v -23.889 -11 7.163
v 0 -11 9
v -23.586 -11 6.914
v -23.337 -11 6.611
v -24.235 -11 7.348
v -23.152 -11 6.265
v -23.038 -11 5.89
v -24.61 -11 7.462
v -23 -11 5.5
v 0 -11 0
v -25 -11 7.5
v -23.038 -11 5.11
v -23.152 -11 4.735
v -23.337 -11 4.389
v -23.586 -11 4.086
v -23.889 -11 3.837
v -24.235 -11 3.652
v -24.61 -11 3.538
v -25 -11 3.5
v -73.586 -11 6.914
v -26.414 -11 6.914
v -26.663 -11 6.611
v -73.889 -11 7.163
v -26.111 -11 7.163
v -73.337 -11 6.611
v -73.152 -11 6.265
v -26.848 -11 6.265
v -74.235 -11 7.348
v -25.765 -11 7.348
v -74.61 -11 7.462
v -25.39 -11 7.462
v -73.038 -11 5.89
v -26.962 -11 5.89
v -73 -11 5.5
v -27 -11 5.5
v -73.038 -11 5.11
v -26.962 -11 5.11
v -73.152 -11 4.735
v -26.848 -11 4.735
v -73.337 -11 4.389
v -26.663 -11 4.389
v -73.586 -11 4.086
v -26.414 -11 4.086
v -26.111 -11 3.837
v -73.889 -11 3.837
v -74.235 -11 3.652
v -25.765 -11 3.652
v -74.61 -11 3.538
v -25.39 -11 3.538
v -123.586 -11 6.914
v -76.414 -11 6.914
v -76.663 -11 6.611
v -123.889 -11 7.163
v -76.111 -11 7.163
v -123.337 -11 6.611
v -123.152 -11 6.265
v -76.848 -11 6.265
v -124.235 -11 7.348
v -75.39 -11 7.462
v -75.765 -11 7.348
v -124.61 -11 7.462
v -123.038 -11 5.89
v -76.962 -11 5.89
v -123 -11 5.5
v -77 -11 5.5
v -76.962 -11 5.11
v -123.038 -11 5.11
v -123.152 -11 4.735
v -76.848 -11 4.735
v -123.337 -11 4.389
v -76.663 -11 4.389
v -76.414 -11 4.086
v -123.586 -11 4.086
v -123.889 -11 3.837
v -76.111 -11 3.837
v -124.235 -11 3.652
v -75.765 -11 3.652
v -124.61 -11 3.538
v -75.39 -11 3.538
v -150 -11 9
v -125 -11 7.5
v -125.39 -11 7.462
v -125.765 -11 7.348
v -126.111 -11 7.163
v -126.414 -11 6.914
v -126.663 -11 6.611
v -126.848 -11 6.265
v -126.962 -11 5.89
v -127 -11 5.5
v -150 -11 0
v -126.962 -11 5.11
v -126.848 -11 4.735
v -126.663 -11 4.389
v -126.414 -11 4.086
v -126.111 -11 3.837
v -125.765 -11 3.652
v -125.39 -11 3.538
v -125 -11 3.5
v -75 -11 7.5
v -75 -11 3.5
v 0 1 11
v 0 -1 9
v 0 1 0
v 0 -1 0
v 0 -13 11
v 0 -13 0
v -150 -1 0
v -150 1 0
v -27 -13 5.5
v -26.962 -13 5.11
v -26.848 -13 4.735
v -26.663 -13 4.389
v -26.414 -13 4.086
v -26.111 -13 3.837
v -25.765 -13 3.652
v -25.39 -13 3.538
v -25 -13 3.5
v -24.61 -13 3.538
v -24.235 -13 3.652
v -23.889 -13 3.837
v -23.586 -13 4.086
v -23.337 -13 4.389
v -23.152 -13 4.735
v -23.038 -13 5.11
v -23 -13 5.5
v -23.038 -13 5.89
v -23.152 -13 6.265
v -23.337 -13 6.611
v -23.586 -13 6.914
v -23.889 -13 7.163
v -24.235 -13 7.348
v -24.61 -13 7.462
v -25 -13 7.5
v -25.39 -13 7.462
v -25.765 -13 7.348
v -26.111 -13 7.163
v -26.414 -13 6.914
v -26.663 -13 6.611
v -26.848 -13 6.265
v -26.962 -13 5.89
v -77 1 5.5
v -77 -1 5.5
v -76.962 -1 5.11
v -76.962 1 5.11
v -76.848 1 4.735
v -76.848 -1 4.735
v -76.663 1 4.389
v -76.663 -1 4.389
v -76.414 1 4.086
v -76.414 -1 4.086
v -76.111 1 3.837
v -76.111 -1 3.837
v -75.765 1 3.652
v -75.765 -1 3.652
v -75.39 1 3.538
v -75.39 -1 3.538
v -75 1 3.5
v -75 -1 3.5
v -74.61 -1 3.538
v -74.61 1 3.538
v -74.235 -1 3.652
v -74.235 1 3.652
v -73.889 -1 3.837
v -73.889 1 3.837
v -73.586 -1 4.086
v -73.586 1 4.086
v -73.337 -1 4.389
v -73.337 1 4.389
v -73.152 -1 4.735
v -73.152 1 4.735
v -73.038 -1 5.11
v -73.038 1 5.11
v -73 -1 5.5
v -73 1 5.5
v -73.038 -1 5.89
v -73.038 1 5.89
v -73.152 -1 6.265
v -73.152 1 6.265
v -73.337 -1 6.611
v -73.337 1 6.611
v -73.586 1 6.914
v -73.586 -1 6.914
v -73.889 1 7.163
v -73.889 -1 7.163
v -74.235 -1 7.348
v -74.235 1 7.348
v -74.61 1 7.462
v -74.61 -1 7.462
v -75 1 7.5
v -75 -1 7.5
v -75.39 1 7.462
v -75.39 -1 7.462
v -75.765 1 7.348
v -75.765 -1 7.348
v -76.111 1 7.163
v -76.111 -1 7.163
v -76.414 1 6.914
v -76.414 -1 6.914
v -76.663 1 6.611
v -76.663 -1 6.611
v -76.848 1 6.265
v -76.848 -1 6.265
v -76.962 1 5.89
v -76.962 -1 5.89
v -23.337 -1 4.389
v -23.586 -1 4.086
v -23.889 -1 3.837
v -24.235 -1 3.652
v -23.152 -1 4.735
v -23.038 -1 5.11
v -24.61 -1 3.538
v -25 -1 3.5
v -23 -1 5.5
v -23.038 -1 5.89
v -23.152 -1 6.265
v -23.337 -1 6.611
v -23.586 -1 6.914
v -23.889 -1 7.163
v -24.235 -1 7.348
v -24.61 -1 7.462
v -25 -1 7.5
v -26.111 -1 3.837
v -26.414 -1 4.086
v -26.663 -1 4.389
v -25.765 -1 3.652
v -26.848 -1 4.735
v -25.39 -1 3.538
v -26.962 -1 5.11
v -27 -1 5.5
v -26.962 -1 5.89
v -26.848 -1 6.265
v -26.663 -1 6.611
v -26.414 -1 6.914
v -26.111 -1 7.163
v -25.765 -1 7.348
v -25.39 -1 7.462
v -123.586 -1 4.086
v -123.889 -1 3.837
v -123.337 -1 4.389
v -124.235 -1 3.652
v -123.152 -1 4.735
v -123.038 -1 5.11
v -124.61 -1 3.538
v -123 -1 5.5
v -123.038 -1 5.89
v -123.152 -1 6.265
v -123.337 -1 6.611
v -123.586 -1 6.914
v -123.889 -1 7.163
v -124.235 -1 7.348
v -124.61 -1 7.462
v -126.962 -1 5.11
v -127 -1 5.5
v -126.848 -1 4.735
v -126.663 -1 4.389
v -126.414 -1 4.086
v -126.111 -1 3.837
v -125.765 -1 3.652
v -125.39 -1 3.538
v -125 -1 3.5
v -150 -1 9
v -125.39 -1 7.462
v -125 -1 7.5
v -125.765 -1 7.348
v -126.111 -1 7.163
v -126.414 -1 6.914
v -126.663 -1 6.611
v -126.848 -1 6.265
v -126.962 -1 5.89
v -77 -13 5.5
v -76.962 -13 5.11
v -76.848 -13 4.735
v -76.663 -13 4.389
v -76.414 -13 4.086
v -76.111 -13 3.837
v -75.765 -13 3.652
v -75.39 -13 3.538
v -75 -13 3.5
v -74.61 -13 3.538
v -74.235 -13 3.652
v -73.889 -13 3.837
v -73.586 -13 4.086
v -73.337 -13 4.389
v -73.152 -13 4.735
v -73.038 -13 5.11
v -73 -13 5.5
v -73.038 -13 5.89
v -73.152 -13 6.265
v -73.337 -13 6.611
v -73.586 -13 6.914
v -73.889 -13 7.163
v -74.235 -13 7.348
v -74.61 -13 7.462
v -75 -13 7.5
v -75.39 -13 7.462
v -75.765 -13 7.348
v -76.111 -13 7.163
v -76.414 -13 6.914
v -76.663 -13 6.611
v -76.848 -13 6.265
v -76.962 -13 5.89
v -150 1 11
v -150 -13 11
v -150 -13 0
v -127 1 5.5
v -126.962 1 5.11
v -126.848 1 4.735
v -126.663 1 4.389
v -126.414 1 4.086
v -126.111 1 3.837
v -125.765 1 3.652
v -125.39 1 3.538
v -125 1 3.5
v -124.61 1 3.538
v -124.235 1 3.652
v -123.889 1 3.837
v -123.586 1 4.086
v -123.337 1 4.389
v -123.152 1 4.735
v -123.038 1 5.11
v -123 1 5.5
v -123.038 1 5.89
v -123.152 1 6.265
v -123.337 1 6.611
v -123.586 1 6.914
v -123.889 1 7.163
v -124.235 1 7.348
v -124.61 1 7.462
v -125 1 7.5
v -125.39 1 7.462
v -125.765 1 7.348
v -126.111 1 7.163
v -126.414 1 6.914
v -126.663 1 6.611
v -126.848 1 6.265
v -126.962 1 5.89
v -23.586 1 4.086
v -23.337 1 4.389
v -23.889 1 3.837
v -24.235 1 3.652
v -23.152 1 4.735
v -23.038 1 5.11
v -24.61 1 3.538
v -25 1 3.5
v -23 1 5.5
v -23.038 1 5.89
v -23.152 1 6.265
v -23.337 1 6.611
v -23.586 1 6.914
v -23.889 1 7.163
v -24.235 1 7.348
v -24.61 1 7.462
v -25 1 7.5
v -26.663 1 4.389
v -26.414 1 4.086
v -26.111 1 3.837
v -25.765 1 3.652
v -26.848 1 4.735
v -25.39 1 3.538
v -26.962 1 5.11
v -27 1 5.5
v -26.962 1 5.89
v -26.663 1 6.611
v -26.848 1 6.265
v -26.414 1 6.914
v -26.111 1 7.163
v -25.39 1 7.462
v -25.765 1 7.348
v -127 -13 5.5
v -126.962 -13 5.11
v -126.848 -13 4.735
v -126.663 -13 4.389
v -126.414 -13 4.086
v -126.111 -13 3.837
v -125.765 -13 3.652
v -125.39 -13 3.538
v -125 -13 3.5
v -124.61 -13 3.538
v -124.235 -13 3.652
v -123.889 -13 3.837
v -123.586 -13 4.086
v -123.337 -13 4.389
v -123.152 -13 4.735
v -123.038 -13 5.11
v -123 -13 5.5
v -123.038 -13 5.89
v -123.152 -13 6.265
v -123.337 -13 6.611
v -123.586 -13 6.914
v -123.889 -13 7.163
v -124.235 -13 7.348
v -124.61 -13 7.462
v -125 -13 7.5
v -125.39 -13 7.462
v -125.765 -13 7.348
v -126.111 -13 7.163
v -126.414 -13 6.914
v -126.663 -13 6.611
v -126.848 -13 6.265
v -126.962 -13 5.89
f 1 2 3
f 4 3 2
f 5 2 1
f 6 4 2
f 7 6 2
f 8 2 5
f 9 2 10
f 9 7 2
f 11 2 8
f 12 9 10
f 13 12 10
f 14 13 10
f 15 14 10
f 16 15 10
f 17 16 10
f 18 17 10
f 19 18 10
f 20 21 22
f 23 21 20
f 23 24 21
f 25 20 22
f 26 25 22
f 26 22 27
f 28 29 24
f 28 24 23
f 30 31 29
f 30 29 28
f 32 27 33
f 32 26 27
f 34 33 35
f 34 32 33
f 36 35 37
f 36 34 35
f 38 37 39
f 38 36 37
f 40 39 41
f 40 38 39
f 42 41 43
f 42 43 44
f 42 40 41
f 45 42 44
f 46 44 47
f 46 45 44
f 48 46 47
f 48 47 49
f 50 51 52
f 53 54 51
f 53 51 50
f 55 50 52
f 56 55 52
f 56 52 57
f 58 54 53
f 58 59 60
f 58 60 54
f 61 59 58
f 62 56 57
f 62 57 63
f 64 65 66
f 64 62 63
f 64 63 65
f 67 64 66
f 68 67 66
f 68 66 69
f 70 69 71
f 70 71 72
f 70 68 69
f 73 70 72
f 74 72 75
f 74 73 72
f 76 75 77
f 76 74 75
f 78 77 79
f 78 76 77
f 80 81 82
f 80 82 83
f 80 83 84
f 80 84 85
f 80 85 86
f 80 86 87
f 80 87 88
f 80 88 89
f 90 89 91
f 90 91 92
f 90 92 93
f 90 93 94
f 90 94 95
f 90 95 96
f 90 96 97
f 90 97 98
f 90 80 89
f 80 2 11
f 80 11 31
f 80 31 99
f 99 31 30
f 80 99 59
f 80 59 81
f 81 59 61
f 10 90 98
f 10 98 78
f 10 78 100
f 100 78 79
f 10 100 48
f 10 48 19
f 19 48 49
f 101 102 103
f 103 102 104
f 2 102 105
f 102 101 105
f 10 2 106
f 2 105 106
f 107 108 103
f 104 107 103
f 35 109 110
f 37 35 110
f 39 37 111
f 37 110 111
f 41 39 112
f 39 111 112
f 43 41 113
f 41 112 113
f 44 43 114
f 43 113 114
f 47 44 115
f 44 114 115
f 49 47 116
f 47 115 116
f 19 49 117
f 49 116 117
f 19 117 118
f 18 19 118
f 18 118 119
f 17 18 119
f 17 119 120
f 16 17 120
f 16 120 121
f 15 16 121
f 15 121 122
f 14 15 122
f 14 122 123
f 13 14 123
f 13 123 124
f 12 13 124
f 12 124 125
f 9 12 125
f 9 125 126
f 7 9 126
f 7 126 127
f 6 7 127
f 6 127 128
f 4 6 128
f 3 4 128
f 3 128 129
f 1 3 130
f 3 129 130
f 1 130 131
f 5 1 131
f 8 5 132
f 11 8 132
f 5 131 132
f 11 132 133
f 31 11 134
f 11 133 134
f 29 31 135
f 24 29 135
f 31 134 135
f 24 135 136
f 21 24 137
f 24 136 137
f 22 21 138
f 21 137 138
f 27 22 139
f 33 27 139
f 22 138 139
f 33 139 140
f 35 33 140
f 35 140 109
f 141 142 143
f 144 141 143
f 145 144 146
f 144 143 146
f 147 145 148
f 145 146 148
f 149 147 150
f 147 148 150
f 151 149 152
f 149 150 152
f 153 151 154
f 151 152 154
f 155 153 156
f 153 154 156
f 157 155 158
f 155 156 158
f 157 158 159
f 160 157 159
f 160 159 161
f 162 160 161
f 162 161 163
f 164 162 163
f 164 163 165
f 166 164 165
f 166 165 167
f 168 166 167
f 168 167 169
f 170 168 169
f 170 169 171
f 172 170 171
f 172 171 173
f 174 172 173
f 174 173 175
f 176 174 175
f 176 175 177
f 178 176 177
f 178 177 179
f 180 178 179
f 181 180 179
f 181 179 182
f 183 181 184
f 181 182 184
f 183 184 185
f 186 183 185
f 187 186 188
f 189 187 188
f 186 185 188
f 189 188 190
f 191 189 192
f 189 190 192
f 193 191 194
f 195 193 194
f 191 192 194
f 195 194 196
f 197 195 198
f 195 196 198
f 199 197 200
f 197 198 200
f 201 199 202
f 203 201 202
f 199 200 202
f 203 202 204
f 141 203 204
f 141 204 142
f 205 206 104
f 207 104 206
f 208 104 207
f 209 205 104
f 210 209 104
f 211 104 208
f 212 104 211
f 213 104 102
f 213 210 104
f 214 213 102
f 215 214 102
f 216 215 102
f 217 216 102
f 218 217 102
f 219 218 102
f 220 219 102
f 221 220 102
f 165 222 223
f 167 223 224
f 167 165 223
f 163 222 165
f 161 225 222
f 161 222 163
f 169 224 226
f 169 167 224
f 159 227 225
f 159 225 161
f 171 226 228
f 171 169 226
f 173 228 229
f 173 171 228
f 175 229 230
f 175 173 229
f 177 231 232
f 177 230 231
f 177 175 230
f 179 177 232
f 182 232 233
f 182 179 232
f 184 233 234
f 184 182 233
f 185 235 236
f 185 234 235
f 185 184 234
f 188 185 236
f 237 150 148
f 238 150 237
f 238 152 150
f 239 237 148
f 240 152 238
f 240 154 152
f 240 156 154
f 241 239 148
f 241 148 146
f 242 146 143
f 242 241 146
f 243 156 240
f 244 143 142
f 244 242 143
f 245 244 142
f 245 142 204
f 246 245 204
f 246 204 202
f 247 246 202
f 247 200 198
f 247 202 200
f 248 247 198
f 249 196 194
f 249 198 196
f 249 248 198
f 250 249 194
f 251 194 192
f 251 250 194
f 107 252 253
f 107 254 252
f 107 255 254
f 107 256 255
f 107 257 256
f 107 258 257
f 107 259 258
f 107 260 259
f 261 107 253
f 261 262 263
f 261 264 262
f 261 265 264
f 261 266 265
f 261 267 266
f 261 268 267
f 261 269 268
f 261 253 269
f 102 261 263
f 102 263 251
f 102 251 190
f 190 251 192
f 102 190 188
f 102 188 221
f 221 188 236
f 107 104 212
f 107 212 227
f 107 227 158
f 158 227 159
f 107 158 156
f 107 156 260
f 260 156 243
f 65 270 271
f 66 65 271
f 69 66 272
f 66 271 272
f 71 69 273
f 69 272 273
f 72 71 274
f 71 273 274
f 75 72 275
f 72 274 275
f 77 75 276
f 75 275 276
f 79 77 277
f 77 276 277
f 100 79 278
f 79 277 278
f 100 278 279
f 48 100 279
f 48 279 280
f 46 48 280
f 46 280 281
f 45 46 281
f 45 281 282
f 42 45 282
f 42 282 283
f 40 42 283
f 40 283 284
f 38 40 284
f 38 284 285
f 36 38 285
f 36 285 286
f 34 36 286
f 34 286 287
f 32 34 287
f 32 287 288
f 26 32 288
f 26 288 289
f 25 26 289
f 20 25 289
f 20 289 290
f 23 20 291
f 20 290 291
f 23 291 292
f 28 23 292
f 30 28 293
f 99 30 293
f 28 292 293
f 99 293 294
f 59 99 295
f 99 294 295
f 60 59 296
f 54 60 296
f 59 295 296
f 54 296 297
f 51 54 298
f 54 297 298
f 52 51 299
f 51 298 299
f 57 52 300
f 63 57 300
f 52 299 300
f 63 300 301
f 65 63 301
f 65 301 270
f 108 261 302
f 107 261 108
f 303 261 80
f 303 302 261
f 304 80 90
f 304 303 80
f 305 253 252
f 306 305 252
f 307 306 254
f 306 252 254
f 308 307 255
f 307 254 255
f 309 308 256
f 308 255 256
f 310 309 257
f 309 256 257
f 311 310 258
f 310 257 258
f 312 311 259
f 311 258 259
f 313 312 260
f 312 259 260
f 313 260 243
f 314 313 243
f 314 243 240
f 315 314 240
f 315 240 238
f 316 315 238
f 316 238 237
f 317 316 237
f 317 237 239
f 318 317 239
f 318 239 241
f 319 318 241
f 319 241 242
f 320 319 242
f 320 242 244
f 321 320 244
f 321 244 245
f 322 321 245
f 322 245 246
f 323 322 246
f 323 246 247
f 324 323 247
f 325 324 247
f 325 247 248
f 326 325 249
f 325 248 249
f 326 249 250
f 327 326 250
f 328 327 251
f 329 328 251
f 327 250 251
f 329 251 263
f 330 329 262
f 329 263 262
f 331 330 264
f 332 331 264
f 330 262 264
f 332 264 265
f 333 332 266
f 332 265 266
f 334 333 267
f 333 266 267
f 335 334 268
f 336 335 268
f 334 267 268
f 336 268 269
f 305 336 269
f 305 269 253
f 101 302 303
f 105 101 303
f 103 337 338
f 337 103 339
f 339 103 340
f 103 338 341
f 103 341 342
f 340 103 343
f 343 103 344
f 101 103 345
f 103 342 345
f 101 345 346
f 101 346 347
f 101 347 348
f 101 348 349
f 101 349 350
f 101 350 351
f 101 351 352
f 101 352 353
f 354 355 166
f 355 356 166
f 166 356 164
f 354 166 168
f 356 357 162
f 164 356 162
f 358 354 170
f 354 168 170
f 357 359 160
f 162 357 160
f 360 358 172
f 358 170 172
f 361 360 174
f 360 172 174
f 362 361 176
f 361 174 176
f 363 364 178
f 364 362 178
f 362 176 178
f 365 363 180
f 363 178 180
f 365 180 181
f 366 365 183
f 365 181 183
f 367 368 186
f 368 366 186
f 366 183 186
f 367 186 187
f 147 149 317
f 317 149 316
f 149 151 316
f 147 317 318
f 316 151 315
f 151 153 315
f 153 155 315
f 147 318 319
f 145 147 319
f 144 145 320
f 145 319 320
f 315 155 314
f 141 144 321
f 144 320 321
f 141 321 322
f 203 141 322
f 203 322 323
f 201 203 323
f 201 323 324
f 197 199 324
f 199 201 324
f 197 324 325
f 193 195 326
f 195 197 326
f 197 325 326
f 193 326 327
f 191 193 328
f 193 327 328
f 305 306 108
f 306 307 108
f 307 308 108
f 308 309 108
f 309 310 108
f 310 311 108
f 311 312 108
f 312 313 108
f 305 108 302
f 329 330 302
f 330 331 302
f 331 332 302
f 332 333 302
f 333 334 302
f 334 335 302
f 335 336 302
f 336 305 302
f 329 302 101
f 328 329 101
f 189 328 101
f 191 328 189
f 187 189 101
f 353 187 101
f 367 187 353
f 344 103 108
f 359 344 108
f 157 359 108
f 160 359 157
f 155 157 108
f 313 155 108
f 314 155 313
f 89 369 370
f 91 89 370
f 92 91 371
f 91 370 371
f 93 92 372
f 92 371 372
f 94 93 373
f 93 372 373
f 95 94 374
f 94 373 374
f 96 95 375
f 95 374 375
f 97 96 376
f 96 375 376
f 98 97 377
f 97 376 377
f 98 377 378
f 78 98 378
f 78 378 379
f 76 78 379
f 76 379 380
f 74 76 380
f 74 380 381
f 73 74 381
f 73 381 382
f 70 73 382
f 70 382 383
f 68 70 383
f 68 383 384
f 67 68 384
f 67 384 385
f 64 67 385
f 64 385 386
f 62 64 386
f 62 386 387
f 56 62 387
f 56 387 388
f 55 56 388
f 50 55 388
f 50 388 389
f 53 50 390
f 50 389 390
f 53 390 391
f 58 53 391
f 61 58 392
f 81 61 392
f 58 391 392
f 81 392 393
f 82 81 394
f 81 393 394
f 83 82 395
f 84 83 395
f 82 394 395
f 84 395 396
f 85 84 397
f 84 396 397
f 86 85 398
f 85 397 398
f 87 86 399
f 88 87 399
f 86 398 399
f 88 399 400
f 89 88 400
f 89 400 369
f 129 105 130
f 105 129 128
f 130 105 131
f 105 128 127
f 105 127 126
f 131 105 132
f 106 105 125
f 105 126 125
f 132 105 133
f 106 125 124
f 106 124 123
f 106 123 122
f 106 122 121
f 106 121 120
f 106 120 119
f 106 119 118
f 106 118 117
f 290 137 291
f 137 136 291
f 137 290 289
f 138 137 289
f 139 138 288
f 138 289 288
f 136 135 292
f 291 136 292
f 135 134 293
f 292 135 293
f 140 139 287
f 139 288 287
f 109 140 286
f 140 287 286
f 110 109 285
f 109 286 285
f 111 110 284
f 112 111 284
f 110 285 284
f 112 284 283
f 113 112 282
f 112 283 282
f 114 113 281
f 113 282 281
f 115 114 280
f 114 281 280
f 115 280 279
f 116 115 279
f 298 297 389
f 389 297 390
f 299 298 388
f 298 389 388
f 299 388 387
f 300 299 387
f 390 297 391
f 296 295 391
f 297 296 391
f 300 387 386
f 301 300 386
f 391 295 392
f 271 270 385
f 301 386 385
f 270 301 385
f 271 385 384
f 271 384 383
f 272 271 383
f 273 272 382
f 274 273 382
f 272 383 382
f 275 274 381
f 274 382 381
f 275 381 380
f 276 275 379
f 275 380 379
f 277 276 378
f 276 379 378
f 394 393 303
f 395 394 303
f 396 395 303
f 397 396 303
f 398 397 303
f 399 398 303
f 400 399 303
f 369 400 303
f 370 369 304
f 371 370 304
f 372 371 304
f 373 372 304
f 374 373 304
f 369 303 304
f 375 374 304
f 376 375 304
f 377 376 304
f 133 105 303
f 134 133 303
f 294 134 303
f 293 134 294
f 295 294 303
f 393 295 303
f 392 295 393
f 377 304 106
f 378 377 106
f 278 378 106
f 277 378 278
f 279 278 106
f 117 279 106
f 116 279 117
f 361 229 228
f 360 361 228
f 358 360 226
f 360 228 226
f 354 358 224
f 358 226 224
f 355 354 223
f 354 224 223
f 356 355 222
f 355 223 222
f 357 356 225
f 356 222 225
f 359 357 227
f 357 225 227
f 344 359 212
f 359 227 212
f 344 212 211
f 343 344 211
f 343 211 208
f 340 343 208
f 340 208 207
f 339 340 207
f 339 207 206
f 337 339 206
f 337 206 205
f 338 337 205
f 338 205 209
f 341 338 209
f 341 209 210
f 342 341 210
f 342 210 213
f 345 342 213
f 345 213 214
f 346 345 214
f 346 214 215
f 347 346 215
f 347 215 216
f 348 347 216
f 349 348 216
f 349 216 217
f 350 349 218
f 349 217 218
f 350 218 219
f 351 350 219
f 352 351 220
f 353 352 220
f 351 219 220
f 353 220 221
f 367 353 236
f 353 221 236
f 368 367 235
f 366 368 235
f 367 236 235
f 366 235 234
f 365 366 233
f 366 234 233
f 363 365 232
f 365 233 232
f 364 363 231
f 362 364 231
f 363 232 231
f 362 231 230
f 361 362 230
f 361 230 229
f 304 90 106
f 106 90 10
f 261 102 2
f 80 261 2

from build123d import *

# Parameters (mm, degrees)
SURFACE_EXTRUDE1_1_BACK  = 150
SURFACE_EXTRUDE1_1_DEPTH = 150
THICKEN1_T1              = 1
THICKEN1_T2              = 1
F_4_0MM_DOWEL_HOLE1_D    = 4


with BuildPart() as body_1:
    # Surface-Extrude1: a surface, the sketch's curves swept straight by 150 mm
    with BuildLine(Plane(origin=(0, 0, 0), x_dir=(0, 0, -1), z_dir=(1, 0, 0)).offset(-SURFACE_EXTRUDE1_1_BACK), mode=Mode.PRIVATE) as surface_extrude1_1_path:
        Line((0, 0), (-10, 0))
        Line((-10, 0), (-10, -12))
        Line((-10, -12), (0, -12))
    surface_extrude1_1 = Shell.extrude(surface_extrude1_1_path.wire(), (1 * SURFACE_EXTRUDE1_1_DEPTH, 0 * SURFACE_EXTRUDE1_1_DEPTH, 0 * SURFACE_EXTRUDE1_1_DEPTH))
    add(Solid.thicken(surface_extrude1_1, THICKEN1_T1))
    add(Solid.thicken(surface_extrude1_1, -THICKEN1_T2))

    # Ø4.0mm Dowel Hole1 (through all)
    with Locations(Plane(origin=(0, 1, 0), x_dir=(1, 0, 0), z_dir=(0, 1, 0))):
        with Locations((-125, -5.5), (-75, -5.5), (-25, -5.5)):
            Hole(F_4_0MM_DOWEL_HOLE1_D / 2)


solid = body_1.part
